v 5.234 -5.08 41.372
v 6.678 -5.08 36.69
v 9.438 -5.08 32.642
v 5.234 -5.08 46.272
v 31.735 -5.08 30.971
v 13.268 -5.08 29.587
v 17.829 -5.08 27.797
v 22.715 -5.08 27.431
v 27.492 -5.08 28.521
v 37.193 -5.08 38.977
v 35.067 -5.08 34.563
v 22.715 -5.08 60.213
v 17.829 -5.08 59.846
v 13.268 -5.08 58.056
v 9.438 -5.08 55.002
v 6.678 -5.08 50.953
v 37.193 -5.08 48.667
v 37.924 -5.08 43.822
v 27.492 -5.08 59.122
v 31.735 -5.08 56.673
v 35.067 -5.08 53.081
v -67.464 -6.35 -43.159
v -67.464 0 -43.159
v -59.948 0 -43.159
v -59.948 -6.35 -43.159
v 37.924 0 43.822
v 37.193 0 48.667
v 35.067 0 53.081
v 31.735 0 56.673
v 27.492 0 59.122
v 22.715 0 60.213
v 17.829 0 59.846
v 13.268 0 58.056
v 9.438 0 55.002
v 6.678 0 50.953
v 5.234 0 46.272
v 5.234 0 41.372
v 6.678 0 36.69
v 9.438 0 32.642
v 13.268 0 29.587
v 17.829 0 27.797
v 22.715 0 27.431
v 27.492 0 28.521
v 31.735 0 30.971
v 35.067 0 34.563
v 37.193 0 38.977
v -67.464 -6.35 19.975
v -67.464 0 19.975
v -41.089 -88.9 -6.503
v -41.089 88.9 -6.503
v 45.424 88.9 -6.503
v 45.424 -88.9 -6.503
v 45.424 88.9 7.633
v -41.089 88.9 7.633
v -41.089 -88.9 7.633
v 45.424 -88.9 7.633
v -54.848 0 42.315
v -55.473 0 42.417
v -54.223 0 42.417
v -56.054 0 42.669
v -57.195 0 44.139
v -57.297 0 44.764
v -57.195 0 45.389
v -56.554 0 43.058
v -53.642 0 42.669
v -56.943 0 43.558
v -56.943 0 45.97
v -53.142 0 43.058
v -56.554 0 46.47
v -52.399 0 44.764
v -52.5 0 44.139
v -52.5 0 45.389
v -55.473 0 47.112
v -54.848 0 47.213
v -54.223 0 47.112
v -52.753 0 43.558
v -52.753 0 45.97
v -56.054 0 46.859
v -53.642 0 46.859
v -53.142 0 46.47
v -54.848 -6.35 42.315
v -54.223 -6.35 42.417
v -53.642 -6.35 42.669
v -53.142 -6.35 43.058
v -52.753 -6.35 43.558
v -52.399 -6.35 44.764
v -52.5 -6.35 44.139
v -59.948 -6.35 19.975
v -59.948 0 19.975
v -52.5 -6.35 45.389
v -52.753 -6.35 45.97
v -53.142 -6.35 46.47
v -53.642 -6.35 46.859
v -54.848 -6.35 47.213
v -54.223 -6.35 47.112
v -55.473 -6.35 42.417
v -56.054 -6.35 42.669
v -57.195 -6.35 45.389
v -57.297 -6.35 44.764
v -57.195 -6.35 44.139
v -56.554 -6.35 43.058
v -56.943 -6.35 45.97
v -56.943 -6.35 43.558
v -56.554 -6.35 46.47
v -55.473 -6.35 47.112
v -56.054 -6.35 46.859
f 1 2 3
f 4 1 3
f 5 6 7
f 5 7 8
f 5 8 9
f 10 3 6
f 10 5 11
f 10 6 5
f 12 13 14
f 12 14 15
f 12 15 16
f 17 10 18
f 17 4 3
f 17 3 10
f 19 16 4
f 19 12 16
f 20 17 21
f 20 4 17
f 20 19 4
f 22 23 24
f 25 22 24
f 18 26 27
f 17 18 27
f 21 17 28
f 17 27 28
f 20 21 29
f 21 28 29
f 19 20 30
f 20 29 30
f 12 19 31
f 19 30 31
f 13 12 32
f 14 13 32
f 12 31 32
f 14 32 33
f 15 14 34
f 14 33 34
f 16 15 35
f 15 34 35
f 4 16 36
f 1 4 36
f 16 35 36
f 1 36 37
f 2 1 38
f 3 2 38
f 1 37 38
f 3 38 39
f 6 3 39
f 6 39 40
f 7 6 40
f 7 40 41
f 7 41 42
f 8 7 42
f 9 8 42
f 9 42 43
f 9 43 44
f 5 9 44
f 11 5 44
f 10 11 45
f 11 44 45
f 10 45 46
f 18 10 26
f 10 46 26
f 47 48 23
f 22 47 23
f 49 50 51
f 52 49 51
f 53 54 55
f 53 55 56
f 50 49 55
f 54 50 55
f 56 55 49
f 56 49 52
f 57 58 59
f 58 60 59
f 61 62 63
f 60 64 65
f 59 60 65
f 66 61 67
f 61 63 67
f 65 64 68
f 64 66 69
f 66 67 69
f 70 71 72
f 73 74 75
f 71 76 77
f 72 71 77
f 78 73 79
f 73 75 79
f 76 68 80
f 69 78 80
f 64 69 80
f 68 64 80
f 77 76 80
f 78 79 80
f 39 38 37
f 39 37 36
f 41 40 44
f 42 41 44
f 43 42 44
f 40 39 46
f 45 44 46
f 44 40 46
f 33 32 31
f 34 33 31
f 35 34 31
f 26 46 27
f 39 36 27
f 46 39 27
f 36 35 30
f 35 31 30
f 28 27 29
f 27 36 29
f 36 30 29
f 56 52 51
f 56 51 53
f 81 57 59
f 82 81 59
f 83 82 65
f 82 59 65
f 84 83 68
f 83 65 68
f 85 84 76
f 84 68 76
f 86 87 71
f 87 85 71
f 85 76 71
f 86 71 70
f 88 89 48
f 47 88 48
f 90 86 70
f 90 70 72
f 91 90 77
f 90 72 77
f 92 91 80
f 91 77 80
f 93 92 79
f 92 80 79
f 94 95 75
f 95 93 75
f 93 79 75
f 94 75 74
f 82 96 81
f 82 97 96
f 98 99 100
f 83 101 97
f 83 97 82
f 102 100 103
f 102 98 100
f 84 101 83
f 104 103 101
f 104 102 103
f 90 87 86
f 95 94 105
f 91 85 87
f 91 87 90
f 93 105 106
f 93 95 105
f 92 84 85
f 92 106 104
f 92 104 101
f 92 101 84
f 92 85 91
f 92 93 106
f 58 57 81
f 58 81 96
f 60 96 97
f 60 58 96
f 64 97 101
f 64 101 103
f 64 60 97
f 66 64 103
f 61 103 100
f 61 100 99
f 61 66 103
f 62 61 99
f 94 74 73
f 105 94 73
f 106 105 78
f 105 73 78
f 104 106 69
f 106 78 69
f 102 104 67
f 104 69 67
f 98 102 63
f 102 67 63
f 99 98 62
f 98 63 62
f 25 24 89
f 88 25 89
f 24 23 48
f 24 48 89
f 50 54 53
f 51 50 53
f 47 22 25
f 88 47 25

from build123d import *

# Parameters (mm, degrees)
F0_W        = 86.512580514
F0_H        = 14.1360429116
F1_DEPTH    = 88.9
F4_DEPTH    = 6.35
F5_R        = 16.4367622898
F6_DEPTH    = 5.08
F7_W        = 4.9004927278
F7_H        = 4.9005001783
F8_DEPTH    = 6.35
F9_T1_DEPTH = 19.05


# Not quite as in the source:
# - a fillet or chamfer that OpenCascade refuses, or shapes differently, is made with other operations: its cross-section is extruded or revolved along the edge and cut away or added


with BuildPart() as f1:
    # F0 (on Front) → F1 (new body)
    with BuildSketch(Plane.XZ):
        with Locations((2.1675266325, 0.5654415581)):
            Rectangle(F0_W, F0_H)
    extrude(amount=F1_DEPTH)

    # F2: F1 across plane


with BuildPart() as f1_1:
    add(f1.part)
    add(f1.part.mirror(Plane.XZ))


with BuildPart() as f4:
    # F3 (on Front) → F4 (new body)
    with BuildSketch(Plane.XZ):
        Polygon((-67.4644317088, 19.9753048493), (-67.4644317088, -43.1589859507), (-59.9484388175, -43.1589859507), (-59.9484388175, 19.9753138556), align=None)
    extrude(amount=F4_DEPTH)


with BuildPart() as f6:
    # F5 (on Front) → F6 (new body)
    with BuildSketch(Plane.XZ):
        with Locations((21.4867834002, 43.8217334449)):
            Circle(F5_R)
    extrude(amount=F6_DEPTH)


with BuildPart() as f8:
    # F7 (on Front) → F8 (new body)
    with BuildSketch(Plane.XZ):
        with Locations((-54.847843945, 44.7641350329)):
            Rectangle(F7_W, F7_H)
    extrude(amount=F8_DEPTH)

    # F9: fillet of radius 2.54 on 4 edges, made by hand

    # F9_s2 → F9_t1 (cut)
    with BuildSketch(Plane.XZ.offset(-6.35)):
        with BuildLine():
            ThreePointArc((-54.7580903089, 47.2143851221), (-56.5541415331, 46.4704363463), (-57.2980903089, 44.6743851221))
            Line((-57.2980903089, 44.6743851221), (-57.2980903089, 47.2143851221))
            Line((-57.2980903089, 47.2143851221), (-54.7580903089, 47.2143851221))
        make_face()
        with BuildLine():
            ThreePointArc((-52.3975975811, 44.6743851221), (-53.1415463569, 46.4704363463), (-54.9375975811, 47.2143851221))
            Line((-54.9375975811, 47.2143851221), (-52.3975975811, 47.2143851221))
            Line((-52.3975975811, 47.2143851221), (-52.3975975811, 44.6743851221))
        make_face()
        with BuildLine():
            ThreePointArc((-54.7580903089, 42.3138849437), (-56.5541415331, 43.0578337195), (-57.2980903089, 44.8538849437))
            Line((-57.2980903089, 44.8538849437), (-57.2980903089, 42.3138849437))
            Line((-57.2980903089, 42.3138849437), (-54.7580903089, 42.3138849437))
        make_face()
        with BuildLine():
            ThreePointArc((-54.9375975811, 42.3138849437), (-53.1415463569, 43.0578337195), (-52.3975975811, 44.8538849437))
            Line((-52.3975975811, 44.8538849437), (-52.3975975811, 42.3138849437))
            Line((-52.3975975811, 42.3138849437), (-54.9375975811, 42.3138849437))
        make_face()
    extrude(amount=F9_T1_DEPTH, mode=Mode.SUBTRACT)


solid = Compound([f1_1.part, f4.part, f6.part, f8.part])
